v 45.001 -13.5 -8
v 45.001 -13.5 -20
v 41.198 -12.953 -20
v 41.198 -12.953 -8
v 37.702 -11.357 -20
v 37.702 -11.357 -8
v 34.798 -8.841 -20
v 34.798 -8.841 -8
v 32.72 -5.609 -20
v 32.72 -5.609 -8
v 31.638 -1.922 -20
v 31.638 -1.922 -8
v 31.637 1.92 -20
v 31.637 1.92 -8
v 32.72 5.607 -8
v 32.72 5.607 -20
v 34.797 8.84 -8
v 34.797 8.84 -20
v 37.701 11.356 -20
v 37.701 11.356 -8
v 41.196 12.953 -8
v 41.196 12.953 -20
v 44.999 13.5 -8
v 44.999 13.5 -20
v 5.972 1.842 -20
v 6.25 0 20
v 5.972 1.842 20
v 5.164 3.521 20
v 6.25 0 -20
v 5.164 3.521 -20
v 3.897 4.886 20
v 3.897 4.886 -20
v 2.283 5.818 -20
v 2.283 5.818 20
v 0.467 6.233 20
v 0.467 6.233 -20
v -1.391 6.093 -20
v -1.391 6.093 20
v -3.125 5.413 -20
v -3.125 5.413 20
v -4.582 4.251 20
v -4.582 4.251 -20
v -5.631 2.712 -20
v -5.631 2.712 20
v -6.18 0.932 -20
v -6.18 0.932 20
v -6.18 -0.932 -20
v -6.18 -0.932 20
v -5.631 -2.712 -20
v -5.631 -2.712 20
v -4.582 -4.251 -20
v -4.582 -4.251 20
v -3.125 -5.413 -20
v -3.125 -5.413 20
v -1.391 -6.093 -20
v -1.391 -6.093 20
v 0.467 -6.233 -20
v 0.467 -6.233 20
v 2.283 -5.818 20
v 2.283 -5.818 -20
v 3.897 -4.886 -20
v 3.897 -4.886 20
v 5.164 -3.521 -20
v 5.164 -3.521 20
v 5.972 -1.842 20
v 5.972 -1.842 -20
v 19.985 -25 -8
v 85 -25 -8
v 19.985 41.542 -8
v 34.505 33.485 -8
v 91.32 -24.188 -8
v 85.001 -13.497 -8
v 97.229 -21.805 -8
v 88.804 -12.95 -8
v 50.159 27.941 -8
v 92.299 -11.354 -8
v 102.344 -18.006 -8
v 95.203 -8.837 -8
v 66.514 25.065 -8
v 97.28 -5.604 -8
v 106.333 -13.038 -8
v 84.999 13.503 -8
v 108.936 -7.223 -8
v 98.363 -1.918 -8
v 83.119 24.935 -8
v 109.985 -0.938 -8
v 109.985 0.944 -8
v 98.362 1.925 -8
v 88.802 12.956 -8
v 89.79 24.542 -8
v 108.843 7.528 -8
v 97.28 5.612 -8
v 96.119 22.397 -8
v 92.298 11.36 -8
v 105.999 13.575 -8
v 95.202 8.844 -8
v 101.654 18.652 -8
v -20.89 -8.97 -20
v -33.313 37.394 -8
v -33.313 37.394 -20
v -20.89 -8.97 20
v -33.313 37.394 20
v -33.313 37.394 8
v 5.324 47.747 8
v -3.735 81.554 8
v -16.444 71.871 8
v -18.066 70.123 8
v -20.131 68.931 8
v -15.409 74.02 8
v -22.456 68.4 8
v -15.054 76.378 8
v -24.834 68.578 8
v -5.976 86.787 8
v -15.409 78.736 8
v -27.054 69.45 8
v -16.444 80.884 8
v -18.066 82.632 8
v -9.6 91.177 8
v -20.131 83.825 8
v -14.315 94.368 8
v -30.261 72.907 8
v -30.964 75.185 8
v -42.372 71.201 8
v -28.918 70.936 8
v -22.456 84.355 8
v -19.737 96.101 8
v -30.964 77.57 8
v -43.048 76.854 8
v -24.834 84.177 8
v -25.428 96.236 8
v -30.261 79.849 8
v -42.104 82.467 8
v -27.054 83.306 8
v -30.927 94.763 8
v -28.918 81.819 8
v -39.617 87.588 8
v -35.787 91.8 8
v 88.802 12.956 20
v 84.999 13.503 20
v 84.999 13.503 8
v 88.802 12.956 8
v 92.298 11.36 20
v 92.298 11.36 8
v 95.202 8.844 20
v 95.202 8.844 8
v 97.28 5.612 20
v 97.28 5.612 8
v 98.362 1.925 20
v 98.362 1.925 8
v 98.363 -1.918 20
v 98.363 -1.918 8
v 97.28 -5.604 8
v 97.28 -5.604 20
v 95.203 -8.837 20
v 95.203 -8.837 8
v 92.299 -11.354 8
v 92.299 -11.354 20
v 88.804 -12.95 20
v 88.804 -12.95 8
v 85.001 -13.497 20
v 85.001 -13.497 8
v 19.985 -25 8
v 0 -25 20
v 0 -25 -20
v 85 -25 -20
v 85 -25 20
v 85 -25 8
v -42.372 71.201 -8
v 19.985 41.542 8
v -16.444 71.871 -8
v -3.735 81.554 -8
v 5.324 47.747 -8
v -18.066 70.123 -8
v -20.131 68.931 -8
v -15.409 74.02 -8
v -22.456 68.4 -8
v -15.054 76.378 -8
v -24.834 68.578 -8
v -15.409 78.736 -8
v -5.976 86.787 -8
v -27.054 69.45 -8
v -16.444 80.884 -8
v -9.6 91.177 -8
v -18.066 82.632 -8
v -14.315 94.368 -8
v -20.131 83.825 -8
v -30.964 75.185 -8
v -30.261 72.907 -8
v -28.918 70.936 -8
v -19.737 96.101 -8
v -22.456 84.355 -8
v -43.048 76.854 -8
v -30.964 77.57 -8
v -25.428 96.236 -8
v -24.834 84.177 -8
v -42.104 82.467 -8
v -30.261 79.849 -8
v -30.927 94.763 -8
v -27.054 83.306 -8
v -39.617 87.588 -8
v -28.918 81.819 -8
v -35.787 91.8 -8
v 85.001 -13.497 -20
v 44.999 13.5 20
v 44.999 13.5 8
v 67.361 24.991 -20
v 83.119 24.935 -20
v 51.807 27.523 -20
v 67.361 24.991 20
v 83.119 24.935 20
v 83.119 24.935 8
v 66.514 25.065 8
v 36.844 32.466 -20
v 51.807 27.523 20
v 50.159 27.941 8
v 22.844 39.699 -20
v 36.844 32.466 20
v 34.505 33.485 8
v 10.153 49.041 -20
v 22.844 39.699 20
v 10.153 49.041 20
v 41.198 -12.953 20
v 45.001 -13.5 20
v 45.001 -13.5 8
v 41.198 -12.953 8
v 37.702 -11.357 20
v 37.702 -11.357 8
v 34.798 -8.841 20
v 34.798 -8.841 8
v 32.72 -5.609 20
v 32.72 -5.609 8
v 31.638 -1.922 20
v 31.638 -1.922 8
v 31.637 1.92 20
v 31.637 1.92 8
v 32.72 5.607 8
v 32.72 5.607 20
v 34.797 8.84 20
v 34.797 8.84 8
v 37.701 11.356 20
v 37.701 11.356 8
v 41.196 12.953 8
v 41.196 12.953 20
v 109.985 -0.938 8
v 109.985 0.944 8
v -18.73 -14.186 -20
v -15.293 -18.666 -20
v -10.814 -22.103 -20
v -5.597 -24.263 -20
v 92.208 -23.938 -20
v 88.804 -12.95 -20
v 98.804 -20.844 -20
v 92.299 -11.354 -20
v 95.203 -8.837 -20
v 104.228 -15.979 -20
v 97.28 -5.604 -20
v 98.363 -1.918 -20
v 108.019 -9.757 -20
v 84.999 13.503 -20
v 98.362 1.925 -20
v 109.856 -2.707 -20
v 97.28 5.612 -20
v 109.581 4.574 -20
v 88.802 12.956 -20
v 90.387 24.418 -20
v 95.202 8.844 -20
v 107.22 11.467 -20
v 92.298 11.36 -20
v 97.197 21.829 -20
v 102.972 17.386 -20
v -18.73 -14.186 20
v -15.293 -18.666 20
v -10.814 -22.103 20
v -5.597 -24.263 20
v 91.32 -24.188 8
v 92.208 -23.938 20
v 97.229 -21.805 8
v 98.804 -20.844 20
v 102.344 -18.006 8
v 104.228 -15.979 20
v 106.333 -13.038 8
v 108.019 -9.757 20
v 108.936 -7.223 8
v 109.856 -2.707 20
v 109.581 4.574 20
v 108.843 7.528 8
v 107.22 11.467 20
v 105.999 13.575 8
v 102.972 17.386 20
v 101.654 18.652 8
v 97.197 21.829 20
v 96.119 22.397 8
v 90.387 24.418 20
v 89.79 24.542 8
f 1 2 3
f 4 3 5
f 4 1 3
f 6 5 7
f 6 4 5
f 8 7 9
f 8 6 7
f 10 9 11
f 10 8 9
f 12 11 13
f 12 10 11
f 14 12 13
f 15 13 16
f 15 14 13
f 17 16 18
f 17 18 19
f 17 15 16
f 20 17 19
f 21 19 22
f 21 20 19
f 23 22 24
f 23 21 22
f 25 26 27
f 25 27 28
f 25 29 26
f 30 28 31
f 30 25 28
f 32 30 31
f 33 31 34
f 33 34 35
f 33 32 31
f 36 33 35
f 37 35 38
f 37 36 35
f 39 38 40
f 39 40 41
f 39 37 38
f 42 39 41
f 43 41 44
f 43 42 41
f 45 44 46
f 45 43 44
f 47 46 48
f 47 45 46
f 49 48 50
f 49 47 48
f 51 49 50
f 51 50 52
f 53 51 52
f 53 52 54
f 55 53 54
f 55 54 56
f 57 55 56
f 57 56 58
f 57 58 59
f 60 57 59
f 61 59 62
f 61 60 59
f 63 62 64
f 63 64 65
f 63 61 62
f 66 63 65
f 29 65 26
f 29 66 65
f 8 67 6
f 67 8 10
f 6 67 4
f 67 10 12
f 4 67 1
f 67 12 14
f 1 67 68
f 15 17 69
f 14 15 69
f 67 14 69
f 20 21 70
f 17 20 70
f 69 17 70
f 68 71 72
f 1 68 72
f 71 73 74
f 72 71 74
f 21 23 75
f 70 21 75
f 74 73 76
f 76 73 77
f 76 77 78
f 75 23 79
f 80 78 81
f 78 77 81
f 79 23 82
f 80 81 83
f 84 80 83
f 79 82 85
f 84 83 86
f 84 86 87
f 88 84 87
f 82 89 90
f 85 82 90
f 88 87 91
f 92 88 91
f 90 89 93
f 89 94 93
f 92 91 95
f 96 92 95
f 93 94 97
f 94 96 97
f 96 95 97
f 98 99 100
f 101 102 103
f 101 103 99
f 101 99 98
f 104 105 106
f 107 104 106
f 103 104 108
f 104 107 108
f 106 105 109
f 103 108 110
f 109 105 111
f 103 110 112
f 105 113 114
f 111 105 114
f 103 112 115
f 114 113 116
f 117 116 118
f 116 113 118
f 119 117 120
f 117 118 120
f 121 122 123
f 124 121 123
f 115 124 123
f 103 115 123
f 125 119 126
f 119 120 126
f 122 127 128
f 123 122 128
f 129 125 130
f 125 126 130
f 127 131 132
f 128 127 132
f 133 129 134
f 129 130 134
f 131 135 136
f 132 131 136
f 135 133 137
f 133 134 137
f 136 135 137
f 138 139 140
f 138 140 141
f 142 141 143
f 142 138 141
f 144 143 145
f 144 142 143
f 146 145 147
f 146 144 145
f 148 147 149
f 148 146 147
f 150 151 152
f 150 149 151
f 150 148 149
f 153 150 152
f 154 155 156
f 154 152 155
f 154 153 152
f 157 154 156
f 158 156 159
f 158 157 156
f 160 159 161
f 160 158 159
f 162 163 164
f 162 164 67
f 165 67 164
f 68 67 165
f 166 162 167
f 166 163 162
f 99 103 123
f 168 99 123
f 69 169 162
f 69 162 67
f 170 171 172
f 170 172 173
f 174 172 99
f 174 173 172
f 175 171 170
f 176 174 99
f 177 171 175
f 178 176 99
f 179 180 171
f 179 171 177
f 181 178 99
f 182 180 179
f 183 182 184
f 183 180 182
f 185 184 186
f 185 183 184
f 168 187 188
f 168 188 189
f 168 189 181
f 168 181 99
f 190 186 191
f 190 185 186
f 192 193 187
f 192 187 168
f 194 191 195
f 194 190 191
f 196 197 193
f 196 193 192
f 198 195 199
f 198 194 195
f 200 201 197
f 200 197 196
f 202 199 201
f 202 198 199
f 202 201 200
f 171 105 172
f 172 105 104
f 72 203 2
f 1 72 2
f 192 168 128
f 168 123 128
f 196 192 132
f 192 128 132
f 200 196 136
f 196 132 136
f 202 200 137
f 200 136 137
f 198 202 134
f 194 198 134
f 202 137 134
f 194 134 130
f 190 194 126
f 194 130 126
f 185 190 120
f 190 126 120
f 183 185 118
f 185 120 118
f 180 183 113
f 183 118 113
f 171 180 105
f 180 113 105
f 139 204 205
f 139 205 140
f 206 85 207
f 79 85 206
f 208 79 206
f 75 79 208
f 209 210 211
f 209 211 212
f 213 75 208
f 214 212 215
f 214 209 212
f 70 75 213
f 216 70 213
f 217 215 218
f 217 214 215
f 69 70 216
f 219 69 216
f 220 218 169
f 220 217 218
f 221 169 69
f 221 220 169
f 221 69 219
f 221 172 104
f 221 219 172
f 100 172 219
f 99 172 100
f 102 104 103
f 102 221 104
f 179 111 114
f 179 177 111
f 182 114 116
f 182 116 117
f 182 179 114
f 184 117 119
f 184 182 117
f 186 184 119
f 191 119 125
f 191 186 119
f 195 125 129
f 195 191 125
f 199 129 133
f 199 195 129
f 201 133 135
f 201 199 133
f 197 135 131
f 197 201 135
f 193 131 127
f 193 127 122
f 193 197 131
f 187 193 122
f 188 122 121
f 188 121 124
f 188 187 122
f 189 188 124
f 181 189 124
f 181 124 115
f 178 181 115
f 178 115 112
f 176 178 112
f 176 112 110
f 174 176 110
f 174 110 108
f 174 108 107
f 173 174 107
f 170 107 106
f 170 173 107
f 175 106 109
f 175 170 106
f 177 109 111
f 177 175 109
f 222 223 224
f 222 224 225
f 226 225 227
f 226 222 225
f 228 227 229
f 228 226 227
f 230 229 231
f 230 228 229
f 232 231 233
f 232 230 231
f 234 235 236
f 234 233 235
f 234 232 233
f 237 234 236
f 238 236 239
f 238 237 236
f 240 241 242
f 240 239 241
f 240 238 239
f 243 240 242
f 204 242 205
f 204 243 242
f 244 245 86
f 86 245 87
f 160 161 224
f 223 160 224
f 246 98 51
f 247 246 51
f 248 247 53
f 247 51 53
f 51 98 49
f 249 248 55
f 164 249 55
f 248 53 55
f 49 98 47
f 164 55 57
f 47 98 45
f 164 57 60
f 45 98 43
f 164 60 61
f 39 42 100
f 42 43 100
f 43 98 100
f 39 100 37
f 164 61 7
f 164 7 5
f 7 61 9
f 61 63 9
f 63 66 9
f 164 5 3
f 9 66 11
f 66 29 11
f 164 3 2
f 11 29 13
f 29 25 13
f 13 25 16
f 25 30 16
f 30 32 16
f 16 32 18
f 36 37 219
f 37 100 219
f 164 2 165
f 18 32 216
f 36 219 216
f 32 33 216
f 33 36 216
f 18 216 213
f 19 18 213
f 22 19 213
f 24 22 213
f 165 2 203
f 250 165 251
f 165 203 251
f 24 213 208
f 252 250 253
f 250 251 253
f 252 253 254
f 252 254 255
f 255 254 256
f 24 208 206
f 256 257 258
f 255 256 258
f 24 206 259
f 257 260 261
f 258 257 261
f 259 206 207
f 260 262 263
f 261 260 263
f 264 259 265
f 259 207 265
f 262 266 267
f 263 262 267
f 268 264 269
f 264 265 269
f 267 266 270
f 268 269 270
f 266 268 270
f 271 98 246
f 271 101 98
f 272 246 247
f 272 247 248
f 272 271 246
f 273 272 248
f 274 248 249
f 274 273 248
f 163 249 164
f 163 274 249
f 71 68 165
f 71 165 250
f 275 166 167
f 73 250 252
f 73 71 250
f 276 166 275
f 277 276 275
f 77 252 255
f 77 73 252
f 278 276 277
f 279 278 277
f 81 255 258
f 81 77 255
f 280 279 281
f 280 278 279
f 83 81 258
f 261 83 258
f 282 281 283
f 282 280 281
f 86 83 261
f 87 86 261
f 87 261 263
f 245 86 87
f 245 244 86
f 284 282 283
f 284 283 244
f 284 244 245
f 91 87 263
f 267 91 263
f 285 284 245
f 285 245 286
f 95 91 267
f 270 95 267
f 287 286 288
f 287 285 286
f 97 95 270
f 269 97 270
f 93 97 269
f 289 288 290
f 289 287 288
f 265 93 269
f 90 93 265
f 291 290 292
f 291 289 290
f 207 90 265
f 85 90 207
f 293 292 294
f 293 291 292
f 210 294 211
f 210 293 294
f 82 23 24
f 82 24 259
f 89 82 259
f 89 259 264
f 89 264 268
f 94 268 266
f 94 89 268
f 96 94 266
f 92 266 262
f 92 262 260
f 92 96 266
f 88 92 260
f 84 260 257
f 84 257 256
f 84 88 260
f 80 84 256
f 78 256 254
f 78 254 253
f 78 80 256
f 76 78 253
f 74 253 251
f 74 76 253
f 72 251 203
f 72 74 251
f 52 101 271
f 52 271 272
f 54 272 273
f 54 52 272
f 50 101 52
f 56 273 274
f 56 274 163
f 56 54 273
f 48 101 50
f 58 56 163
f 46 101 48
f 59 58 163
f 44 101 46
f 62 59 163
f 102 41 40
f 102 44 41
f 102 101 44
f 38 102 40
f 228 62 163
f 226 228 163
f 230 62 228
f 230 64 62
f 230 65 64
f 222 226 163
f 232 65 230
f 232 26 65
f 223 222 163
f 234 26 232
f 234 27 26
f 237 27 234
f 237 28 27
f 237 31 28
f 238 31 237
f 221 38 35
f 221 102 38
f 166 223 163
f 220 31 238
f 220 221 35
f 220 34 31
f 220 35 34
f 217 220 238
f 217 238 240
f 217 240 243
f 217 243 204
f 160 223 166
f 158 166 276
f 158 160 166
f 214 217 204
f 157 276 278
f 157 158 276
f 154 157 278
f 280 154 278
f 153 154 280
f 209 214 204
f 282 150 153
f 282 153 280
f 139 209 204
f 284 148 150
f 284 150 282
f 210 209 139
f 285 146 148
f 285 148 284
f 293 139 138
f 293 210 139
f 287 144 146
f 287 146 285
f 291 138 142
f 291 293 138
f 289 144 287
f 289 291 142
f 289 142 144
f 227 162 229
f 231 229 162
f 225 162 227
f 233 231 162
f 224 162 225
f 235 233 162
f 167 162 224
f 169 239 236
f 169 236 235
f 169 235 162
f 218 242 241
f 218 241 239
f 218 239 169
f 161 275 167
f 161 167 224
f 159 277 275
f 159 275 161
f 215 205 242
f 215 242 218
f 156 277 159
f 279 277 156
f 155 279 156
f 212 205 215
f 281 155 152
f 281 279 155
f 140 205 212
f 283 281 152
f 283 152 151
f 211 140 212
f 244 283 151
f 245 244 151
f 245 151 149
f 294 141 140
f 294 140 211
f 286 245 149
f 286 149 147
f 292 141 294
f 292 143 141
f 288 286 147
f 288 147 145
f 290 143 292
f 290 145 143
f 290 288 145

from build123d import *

# Parameters (mm, degrees)
SKETCH1_R           = 6.25
BOSS_EXTRUDE1_DEPTH = 20
SKETCH2_R           = 8
BOSS_EXTRUDE2_DEPTH = 8
SKETCH3_W           = 16
SKETCH3_H           = 332.488311808
CUT_EXTRUDE1_DEPTH  = 90


with BuildPart() as part:
    # Sketch1 → Boss-Extrude1 (new, symmetric)
    with BuildSketch(Plane.XY):
        with BuildLine():
            Line((0, -25), (85, -25))
            ThreePointArc((85, -25), (109.985084644, 0.943739672), (83.11944661, 24.934770827))
            ThreePointArc((83.11944661, 24.934770827), (44.228399081, 29.699192353), (10.153265793, 49.040820564))
            Line((10.153265793, 49.040820564), (-33.31339639, 37.393963534))
            Line((-33.31339639, 37.393963534), (-20.890082225, -8.970476128))
            ThreePointArc((-20.890082225, -8.970476128), (-13.165686186, -20.530851753), (0, -25))
        make_face()
        Circle(SKETCH1_R, mode=Mode.SUBTRACT)
        with BuildLine():
            Line((85.000943792, -13.497203546), (45.00094389, -13.499999967))
            ThreePointArc((45.00094389, -13.499999967), (31.500000131, -0.000943792), (44.999056306, 13.499999967))
            Line((44.999056306, 13.499999967), (84.999056208, 13.502796388))
            ThreePointArc((84.999056208, 13.502796388), (98.499999967, 0.003740213), (85.000943792, -13.497203546))
        make_face(mode=Mode.SUBTRACT)
    extrude(amount=BOSS_EXTRUDE1_DEPTH, both=True)

    # Sketch2 → Boss-Extrude2 (add, symmetric)
    with BuildSketch(Plane.XY):
        with BuildLine():
            Line((-33.31339639, 37.393963534), (-42.372062969, 71.201367454))
            ThreePointArc((-42.372062969, 71.201367454), (-28.229927345, 95.696264882), (-3.735029917, 81.554129259))
            Line((-3.735029917, 81.554129259), (5.323636662, 47.746725338))
            Line((5.323636662, 47.746725338), (-33.31339639, 37.393963534))
        make_face()
        with Locations((-23.053546443, 76.377748356)):
            Circle(SKETCH2_R, mode=Mode.SUBTRACT)
    extrude(amount=BOSS_EXTRUDE2_DEPTH, both=True)

    # Sketch3 → Cut-Extrude1 (cut)
    with BuildSketch(Plane(origin=(109.985084644, 0, 0), x_dir=(0, 0, -1), z_dir=(1, 0, 0))):
        with Locations((0, -25)):
            Rectangle(SKETCH3_W, SKETCH3_H)
    extrude(amount=-CUT_EXTRUDE1_DEPTH, mode=Mode.SUBTRACT)


solid = part.part
